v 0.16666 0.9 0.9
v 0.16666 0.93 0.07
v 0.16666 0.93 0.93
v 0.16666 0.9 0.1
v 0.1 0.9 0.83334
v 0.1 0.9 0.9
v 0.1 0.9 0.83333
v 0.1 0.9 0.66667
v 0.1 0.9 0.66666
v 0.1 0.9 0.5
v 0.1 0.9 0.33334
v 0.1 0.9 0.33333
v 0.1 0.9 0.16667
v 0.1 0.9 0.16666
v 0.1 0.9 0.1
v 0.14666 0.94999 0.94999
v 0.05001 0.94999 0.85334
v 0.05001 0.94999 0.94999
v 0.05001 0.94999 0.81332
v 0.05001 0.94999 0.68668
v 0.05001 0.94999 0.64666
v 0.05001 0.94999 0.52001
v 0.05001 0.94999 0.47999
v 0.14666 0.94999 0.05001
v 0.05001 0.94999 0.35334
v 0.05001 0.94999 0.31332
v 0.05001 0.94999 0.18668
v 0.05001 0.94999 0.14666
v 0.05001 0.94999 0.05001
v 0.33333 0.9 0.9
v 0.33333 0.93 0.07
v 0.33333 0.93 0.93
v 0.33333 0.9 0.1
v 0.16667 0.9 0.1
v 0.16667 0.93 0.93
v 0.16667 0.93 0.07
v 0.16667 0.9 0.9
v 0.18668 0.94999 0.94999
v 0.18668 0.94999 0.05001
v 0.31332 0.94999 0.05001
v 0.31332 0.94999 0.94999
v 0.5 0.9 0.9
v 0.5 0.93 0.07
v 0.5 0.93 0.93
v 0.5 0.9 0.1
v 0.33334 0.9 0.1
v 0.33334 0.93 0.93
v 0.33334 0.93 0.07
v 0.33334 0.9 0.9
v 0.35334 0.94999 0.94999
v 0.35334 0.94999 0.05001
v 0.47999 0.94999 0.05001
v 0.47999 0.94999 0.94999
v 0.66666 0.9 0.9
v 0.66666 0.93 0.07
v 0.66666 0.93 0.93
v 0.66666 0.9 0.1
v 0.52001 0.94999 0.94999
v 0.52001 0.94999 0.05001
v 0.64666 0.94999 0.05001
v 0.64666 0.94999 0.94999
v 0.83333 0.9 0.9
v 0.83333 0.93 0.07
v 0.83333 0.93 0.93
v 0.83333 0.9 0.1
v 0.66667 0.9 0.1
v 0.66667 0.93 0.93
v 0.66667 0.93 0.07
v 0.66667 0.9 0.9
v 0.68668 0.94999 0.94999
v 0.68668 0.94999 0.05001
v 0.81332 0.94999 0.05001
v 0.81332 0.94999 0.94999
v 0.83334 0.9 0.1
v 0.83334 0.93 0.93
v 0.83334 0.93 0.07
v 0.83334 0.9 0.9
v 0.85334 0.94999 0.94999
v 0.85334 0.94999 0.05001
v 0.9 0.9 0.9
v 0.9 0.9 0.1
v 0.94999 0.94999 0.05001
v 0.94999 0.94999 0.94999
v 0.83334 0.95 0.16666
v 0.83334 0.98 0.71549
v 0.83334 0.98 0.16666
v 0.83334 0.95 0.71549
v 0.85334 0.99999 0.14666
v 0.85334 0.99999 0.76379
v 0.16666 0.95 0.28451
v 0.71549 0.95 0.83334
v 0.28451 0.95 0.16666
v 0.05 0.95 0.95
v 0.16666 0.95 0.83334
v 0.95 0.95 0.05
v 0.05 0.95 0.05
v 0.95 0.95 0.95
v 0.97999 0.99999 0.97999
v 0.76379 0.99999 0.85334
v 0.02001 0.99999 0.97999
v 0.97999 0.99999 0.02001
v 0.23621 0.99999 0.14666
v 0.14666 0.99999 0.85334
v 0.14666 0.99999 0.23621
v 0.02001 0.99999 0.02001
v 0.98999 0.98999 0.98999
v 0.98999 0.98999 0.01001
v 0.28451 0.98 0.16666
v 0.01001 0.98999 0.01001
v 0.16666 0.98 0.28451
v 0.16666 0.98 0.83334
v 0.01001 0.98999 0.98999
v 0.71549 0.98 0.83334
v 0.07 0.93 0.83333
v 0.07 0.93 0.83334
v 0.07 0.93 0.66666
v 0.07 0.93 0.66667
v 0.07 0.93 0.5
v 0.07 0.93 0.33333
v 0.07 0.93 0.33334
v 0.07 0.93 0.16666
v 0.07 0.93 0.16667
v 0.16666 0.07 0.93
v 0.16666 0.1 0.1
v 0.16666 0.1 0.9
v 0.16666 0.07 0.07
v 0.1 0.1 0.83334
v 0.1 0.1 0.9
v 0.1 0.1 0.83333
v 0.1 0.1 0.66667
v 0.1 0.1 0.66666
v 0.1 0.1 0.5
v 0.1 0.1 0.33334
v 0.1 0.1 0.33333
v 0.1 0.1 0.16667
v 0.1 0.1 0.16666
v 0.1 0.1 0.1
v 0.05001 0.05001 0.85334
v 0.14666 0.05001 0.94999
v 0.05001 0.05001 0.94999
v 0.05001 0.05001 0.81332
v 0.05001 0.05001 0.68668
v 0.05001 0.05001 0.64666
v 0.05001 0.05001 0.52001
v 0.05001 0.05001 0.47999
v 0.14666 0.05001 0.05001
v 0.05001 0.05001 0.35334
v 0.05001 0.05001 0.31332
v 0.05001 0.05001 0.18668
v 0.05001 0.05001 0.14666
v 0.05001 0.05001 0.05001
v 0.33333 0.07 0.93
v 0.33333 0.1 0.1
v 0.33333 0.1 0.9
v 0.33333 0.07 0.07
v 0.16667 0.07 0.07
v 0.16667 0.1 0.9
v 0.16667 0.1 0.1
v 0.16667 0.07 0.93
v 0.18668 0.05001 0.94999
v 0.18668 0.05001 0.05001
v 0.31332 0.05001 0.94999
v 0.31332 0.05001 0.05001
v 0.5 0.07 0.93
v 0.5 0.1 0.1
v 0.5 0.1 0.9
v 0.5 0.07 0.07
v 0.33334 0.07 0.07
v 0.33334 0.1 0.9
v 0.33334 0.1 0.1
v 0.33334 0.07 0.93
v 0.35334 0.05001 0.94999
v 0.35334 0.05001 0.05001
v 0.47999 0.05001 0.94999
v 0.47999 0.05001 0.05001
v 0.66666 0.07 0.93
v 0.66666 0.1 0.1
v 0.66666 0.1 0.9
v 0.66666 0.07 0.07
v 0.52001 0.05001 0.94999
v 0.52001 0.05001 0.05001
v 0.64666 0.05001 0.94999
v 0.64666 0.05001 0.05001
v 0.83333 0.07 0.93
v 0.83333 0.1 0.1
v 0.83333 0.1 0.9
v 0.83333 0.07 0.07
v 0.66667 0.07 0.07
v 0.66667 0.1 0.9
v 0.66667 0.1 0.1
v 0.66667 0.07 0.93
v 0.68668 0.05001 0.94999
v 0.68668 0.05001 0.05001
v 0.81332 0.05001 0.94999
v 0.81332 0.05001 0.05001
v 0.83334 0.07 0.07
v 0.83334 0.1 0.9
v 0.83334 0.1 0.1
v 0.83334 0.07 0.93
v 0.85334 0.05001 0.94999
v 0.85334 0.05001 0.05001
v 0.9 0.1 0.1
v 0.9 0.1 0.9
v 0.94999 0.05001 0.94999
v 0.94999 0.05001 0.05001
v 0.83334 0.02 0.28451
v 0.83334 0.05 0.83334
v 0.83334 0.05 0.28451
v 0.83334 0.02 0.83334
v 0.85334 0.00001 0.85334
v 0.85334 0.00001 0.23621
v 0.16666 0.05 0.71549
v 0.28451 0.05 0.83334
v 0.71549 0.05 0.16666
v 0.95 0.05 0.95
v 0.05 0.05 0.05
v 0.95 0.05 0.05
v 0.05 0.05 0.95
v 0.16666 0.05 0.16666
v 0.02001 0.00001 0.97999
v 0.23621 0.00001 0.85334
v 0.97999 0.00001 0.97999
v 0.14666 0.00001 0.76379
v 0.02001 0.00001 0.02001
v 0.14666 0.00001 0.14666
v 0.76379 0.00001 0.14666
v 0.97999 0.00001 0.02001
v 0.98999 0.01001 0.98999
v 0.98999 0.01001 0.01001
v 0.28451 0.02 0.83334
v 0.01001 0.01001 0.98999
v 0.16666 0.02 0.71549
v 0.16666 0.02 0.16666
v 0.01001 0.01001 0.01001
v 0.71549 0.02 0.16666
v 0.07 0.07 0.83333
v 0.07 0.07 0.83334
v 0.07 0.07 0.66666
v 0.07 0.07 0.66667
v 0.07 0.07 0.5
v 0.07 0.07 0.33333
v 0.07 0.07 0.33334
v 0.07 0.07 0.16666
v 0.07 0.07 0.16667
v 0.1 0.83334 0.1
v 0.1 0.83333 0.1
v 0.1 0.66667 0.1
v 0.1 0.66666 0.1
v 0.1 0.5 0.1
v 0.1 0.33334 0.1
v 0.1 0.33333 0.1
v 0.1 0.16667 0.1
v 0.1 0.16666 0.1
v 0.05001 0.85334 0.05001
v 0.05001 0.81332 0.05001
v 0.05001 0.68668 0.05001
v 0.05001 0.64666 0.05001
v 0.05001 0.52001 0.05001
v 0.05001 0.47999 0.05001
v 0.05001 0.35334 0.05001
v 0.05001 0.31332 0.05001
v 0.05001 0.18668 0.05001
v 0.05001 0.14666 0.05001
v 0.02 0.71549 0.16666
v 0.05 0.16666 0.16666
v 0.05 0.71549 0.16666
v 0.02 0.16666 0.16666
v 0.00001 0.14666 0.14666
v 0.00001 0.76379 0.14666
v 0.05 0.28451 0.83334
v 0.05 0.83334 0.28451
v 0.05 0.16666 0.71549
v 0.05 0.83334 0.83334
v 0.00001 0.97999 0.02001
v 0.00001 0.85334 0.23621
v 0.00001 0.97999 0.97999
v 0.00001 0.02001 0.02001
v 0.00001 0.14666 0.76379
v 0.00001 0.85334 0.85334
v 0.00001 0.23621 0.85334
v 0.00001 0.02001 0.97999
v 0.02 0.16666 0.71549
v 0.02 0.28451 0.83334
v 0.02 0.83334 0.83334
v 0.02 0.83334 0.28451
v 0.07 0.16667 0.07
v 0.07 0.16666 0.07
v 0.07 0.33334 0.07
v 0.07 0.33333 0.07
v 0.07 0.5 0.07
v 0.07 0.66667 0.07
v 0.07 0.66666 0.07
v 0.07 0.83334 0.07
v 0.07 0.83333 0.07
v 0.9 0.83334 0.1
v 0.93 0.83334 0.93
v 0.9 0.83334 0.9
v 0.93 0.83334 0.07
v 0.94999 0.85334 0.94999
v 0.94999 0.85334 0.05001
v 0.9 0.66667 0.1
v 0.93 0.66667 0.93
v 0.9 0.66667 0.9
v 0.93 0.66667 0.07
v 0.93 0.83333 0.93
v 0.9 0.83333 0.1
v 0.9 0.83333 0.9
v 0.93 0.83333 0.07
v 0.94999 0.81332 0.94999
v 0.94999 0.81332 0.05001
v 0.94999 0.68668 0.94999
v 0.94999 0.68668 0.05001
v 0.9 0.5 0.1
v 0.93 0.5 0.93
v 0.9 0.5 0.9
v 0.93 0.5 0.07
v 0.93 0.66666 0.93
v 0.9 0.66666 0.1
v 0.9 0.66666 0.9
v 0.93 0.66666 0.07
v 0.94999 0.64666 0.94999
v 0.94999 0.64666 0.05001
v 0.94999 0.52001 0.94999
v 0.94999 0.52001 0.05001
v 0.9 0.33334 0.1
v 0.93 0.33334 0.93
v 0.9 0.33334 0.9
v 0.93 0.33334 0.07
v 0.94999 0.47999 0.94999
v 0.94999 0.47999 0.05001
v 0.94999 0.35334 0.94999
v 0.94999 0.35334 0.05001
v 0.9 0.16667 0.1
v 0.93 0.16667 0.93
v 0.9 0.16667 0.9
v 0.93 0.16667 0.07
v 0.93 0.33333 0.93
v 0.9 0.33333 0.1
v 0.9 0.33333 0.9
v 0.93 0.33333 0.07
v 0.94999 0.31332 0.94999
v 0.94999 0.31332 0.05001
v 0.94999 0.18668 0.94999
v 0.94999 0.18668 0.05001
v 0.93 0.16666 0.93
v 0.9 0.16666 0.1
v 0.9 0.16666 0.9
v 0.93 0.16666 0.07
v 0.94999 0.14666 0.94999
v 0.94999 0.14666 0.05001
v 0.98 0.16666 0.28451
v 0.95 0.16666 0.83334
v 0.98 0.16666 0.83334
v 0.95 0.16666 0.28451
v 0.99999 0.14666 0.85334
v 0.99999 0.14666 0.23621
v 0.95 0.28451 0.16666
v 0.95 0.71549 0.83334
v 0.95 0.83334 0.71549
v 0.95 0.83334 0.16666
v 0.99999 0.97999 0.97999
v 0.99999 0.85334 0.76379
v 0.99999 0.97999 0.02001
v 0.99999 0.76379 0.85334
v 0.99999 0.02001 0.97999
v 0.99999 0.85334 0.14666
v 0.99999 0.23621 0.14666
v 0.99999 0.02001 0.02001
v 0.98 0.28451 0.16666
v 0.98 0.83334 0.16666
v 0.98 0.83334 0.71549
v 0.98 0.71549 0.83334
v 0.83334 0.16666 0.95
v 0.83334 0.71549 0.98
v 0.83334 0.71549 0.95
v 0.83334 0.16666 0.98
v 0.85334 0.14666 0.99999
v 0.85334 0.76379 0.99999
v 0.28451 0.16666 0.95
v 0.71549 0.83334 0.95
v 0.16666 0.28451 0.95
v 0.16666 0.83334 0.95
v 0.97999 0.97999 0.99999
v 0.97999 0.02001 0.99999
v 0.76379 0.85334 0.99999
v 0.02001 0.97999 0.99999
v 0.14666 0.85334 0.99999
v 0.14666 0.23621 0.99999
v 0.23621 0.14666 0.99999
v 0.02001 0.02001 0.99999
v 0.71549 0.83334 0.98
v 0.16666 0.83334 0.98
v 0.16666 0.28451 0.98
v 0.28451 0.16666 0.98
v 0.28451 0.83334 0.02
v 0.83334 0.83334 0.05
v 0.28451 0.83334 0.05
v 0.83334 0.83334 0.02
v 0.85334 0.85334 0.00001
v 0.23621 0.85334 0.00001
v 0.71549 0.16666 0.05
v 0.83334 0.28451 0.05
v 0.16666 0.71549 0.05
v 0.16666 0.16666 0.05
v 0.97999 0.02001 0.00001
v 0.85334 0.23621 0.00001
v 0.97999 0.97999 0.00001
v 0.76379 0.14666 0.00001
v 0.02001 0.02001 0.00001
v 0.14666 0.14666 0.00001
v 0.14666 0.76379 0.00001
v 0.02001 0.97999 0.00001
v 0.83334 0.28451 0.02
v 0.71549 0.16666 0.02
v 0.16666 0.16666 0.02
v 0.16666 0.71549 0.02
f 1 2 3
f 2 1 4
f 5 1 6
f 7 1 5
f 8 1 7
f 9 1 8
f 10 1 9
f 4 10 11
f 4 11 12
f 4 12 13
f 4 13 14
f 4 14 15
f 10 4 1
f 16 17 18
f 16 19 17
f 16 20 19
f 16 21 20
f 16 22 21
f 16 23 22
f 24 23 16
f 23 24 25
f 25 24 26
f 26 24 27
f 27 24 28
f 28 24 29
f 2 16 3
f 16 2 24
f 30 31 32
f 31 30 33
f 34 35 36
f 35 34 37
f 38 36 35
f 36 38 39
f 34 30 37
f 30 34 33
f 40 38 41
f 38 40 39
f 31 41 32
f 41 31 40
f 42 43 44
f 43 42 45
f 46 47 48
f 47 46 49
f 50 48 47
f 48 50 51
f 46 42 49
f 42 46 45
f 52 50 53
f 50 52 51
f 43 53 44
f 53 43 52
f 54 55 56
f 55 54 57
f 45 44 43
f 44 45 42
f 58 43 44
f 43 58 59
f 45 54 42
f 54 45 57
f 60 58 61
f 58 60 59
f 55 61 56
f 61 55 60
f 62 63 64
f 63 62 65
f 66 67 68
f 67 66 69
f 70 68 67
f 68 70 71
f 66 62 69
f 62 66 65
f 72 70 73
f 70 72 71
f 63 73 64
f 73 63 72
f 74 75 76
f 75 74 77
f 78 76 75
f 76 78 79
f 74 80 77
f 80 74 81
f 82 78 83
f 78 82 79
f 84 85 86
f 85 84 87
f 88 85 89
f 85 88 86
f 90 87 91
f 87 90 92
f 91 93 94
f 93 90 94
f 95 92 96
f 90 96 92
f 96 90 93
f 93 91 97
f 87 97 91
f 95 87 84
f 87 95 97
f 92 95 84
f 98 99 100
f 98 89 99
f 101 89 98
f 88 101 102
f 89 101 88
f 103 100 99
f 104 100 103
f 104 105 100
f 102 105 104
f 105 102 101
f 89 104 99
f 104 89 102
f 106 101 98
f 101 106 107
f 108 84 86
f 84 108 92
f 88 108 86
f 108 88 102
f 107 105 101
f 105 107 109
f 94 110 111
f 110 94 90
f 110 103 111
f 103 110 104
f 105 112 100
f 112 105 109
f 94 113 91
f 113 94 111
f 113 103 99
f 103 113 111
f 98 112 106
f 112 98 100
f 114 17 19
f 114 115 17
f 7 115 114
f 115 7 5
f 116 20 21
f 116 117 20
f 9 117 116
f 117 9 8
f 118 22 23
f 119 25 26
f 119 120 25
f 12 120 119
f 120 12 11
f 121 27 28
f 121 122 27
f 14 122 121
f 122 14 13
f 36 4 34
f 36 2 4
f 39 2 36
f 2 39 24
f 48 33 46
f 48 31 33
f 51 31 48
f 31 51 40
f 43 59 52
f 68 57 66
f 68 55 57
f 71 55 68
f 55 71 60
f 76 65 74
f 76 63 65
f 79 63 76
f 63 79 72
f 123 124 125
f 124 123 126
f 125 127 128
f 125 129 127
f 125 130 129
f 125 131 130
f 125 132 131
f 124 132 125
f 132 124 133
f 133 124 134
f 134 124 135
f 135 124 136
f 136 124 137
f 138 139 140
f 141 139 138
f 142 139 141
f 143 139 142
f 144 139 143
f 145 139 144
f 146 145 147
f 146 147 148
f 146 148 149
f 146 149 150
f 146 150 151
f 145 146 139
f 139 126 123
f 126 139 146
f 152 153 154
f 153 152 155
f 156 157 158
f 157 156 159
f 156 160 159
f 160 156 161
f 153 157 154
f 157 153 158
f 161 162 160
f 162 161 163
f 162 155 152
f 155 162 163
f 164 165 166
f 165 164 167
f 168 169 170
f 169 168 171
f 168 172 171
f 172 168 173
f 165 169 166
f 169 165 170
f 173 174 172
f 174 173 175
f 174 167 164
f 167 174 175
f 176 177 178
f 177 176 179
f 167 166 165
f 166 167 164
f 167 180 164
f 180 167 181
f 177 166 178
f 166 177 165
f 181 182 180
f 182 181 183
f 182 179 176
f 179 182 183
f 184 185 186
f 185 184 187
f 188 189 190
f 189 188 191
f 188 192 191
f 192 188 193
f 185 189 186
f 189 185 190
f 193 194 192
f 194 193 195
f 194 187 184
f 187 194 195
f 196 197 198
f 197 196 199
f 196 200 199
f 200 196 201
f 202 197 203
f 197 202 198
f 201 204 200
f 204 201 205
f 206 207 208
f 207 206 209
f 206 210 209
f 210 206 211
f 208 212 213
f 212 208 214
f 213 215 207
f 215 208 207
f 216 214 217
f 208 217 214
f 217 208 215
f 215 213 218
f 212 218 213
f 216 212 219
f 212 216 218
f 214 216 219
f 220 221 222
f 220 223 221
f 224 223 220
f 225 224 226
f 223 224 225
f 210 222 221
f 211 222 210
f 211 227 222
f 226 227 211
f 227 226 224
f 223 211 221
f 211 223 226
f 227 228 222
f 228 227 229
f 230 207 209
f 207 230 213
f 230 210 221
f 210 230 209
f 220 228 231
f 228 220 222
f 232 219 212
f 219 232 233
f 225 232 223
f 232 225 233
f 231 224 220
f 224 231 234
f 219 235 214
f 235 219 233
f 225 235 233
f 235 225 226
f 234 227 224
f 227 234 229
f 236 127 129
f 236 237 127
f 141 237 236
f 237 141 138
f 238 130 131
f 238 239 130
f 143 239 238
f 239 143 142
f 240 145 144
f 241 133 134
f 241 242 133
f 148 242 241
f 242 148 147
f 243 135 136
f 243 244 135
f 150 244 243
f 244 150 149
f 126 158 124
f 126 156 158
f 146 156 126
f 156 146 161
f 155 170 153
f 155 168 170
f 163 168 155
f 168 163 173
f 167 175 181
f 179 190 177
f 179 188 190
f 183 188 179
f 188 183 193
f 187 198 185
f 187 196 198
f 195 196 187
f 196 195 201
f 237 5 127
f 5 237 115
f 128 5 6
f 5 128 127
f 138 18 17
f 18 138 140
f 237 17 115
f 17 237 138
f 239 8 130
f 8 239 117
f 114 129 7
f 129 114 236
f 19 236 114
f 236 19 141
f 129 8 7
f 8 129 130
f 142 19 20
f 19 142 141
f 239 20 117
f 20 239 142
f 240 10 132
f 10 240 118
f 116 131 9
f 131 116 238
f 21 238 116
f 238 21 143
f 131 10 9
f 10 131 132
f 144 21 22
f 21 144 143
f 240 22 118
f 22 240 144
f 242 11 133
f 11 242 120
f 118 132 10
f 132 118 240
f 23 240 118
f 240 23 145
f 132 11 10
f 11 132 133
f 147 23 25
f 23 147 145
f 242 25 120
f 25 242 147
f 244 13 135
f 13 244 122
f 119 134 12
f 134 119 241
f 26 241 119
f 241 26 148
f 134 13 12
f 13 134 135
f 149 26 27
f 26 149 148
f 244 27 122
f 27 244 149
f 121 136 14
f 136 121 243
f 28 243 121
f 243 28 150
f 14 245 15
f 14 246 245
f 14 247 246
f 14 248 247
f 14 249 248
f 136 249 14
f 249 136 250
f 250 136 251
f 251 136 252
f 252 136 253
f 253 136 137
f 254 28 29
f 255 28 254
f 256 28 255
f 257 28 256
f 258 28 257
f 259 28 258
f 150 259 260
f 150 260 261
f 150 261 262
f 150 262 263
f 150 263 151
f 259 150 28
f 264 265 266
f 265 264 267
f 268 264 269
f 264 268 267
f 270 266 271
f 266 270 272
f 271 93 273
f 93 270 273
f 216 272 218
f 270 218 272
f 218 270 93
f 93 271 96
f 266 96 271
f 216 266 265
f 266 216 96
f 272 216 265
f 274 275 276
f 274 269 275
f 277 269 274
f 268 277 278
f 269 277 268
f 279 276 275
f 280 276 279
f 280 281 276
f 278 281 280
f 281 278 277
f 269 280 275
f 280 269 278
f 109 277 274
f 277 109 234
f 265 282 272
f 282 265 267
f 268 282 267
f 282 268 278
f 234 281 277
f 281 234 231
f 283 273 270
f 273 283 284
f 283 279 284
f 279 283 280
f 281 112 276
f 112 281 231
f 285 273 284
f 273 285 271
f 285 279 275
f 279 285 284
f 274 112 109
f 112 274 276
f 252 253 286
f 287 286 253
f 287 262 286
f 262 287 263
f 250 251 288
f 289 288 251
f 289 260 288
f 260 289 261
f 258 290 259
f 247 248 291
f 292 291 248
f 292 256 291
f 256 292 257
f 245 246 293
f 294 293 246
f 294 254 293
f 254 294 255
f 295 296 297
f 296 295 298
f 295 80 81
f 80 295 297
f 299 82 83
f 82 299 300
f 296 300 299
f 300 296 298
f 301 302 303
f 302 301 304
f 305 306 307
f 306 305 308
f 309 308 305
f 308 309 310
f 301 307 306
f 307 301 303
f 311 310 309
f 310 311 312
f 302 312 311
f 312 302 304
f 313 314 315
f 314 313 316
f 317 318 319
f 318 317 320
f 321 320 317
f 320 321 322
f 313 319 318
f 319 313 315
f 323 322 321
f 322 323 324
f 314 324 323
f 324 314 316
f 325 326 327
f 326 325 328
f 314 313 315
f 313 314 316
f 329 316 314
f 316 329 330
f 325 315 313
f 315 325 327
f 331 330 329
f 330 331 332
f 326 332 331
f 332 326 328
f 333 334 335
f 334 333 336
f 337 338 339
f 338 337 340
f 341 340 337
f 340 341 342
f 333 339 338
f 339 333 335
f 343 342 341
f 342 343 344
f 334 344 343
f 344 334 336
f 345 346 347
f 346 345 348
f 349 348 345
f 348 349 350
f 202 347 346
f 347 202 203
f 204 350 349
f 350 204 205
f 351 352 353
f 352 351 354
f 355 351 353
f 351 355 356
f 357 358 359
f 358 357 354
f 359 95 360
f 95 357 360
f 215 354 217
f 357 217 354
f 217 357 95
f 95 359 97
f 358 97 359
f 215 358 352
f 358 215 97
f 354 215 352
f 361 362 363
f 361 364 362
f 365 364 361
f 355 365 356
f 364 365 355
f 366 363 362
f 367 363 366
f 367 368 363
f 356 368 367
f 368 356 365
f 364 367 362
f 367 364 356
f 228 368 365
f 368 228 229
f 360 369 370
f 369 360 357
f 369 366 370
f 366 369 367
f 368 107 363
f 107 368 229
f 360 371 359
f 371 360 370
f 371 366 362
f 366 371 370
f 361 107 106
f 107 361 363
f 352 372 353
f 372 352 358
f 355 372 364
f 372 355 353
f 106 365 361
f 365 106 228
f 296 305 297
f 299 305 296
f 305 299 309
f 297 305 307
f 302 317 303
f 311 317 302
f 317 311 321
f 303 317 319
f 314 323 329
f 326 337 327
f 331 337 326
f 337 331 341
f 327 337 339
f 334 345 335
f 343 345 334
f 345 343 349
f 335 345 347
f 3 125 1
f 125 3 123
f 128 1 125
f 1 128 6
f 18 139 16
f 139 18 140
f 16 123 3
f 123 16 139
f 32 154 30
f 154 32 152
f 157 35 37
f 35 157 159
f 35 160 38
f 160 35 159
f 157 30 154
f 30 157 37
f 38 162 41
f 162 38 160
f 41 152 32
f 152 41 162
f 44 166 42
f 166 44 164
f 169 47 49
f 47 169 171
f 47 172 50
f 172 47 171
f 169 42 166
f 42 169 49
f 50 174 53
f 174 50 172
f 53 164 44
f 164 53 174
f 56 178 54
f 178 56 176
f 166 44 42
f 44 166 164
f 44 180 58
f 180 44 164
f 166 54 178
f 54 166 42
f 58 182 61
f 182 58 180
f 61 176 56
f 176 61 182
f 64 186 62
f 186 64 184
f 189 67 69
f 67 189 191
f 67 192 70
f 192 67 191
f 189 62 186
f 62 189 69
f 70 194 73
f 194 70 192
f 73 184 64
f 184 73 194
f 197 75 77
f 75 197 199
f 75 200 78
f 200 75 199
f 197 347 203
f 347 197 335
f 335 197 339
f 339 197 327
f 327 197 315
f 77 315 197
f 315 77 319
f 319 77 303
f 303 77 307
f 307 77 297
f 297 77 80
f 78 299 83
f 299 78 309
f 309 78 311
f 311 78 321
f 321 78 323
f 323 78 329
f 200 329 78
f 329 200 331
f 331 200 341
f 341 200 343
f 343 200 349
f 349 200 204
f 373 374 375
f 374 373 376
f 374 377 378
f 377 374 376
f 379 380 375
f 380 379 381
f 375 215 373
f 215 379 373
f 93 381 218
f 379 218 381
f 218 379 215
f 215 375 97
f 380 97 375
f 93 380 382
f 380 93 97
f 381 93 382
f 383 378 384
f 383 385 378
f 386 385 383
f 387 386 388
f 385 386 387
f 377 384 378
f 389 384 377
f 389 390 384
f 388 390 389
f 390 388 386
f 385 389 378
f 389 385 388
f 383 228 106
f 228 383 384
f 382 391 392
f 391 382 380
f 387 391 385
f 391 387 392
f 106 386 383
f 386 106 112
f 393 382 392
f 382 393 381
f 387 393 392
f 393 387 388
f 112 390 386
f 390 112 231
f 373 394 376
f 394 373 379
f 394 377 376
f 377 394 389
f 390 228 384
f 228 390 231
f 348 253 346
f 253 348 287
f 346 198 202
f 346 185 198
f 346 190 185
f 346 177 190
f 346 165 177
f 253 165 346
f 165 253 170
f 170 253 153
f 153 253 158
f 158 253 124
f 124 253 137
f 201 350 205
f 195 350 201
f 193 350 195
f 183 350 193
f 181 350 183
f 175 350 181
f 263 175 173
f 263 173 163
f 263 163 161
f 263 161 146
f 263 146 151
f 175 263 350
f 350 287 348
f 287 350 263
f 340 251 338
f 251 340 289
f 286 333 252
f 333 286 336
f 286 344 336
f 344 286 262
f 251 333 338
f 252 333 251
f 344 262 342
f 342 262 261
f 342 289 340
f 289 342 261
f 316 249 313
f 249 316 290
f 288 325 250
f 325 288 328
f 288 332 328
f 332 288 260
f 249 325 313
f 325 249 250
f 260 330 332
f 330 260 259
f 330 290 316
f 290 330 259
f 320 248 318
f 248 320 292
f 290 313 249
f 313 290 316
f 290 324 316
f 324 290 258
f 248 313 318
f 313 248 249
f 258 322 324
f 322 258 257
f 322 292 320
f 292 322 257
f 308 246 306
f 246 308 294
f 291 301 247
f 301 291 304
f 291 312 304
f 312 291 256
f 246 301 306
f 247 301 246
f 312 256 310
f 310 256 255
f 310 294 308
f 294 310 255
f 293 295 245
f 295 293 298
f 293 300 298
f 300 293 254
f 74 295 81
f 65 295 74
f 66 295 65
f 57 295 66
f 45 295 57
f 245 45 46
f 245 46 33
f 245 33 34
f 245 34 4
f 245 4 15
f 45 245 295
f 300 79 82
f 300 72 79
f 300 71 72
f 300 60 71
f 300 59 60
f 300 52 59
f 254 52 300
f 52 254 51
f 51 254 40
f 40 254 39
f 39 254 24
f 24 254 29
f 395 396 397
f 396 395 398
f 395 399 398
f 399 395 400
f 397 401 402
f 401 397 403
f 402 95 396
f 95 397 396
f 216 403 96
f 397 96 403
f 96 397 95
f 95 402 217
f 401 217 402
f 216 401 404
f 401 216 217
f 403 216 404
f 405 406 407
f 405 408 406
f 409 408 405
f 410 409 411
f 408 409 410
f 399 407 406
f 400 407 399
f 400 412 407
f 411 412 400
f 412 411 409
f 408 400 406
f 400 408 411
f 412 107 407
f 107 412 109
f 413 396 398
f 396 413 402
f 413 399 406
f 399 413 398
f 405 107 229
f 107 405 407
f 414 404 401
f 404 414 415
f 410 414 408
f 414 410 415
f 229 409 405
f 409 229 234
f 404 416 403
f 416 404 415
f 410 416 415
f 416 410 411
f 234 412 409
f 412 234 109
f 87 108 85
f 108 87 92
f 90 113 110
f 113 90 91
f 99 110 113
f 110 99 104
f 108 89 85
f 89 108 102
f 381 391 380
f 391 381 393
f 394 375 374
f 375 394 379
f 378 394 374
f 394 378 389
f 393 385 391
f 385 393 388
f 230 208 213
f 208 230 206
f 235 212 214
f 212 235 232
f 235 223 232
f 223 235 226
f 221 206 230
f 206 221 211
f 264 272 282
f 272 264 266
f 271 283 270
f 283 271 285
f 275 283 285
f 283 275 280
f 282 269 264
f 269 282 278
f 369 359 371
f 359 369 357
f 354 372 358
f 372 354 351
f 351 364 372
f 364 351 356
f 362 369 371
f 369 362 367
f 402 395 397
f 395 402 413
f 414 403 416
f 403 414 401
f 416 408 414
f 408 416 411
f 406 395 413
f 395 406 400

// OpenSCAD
module theBox(){
  box_color=[0.6,0.2,0];
  plank_width=1/6;
  plank_height=0.05;
  plank_cut=0.02;
  
  module plank(length){
    linear_extrude(length,center=true)
    polygon([[-plank_width/2,0],
             [plank_width/2,0],
             [plank_width/2,plank_height-plank_cut],
             [plank_width/2-plank_cut,plank_height],
             [-(plank_width/2-plank_cut),plank_height],
             [-plank_width/2,plank_height-plank_cut]]
    );
  }
  
  module face(){
    difference(){
      union(){
        // Parallel planks
        for(i=[0:(1/plank_width)-plank_width]){
          translate([plank_width*i,0,0]) // Slide on face
          translate([plank_width/2-0.5,0.5-(plank_height*2),0]) // Put plank on face
          plank(1);
        }
        
        // Borders
        for(i=[0:90:270]){
          rotate([0,i,0])
          intersection(){
            translate([0.5-plank_width/2,0.5-plank_height,0]) plank(1);
            rotate([90,45,0]) linear_extrude(2,center=true) polygon([[0,0],[0,1.5],[1.5,0]]);
          }
        }
      }
      linear_extrude(2,center=true) polygon([[-2,2],[-2,0],[0,0]]);
      rotate([0,90,0]) linear_extrude(2,center=true) polygon([[-1.5,1.5],[-1.5,0],[0,0]]);
      rotate([0,180,0]) linear_extrude(2,center=true) polygon([[-1.5,1.5],[-1.5,0],[0,0]]);
      rotate([0,270,0]) linear_extrude(2,center=true) polygon([[-1.5,1.5],[-1.5,0],[0,0]]);
    }
  }
  
  color(box_color)
  render(convexity=10)
  translate([0.5,0.5,0.5]){
    // Faces
    face();
    rotate([180,0,0]) face();
    rotate([0,90,90]) face();
    rotate([0,0,-90]) face();
    rotate([90,0,0]) face();
    rotate([270,0,90]) face();
    
    // Diagonal planks
    rotate([0,0,0]) rotate([0,45,0]) translate([0,0.5-plank_height,0]) plank(1);
    rotate([90,0,90]) rotate([0,45,0]) translate([0,0.5-plank_height,0]) plank(1);
    rotate([180,0,0]) rotate([0,45,0]) translate([0,0.5-plank_height,0]) plank(1);
    rotate([0,90,90]) rotate([0,45,0]) translate([0,0.5-plank_height,0]) plank(1);
    rotate([180,90,90]) rotate([0,45,0]) translate([0,0.5-plank_height,0]) plank(1);
    rotate([270,0,90]) rotate([0,45,0]) translate([0,0.5-plank_height,0]) plank(1);
  }
}

theBox();
